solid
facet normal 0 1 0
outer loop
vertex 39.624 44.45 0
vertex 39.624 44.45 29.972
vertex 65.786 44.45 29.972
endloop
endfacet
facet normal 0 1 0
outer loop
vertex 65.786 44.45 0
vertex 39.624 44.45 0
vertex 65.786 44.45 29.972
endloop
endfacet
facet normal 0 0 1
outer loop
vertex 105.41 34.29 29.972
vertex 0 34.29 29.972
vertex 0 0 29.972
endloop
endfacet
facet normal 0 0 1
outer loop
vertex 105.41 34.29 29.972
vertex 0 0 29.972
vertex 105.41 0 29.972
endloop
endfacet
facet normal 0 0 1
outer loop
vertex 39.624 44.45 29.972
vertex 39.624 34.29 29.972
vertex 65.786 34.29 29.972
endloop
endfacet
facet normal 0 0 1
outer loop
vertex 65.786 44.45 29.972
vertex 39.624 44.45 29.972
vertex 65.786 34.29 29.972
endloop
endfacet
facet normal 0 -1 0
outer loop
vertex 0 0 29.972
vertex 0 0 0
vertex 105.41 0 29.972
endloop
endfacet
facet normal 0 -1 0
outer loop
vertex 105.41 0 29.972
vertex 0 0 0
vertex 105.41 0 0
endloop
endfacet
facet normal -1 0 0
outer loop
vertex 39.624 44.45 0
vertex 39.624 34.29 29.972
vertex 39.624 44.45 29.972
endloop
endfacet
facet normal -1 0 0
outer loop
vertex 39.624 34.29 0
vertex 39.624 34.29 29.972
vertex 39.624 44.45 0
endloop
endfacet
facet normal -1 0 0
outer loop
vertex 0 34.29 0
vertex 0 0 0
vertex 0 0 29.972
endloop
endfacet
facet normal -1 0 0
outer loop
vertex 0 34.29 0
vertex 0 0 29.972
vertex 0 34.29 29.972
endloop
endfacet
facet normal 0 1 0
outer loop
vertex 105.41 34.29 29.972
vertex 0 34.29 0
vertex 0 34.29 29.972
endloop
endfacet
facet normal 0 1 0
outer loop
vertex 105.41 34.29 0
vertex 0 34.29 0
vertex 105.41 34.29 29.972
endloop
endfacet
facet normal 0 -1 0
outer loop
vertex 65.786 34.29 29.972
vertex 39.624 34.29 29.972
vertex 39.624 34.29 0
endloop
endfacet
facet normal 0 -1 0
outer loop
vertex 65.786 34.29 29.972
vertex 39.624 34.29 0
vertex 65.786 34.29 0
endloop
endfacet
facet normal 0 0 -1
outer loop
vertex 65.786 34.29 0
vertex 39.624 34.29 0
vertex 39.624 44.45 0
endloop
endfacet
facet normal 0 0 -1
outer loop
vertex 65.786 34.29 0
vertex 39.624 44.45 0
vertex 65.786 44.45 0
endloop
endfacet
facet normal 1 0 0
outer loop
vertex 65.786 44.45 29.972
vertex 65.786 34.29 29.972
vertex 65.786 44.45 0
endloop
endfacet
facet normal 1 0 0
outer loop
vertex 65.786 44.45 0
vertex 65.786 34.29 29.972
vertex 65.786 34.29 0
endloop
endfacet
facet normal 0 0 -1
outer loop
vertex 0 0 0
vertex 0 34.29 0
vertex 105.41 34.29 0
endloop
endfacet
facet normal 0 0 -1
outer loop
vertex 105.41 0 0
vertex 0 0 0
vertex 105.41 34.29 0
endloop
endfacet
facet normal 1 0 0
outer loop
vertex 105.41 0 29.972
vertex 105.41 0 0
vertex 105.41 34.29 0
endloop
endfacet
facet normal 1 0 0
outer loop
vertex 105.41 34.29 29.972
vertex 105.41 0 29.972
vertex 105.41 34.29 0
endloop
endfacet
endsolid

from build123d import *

# Parameters (mm, degrees)
SKETCH1_W           = 105.41
SKETCH1_H           = 34.29
BOSS_EXTRUDE1_DEPTH = 29.972
SKETCH2_W           = 26.162
SKETCH2_H           = 29.972
BOSS_EXTRUDE2_DEPTH = 10.16


with BuildPart() as part:
    # Sketch1 → Boss-Extrude1 (new body)
    with BuildSketch(Plane.XY):
        with Locations((52.705, 17.145)):
            Rectangle(SKETCH1_W, SKETCH1_H)
    extrude(amount=BOSS_EXTRUDE1_DEPTH)


with BuildPart() as body_2:
    # Sketch2 → Boss-Extrude2 (new body)
    with BuildSketch(Plane(origin=(0, 34.29, 0), x_dir=(1, 0, 0), z_dir=(0, 1, 0))):
        with Locations((52.705, -14.986)):
            Rectangle(SKETCH2_W, SKETCH2_H)
    extrude(amount=BOSS_EXTRUDE2_DEPTH)


solid = Compound([part.part, body_2.part])
